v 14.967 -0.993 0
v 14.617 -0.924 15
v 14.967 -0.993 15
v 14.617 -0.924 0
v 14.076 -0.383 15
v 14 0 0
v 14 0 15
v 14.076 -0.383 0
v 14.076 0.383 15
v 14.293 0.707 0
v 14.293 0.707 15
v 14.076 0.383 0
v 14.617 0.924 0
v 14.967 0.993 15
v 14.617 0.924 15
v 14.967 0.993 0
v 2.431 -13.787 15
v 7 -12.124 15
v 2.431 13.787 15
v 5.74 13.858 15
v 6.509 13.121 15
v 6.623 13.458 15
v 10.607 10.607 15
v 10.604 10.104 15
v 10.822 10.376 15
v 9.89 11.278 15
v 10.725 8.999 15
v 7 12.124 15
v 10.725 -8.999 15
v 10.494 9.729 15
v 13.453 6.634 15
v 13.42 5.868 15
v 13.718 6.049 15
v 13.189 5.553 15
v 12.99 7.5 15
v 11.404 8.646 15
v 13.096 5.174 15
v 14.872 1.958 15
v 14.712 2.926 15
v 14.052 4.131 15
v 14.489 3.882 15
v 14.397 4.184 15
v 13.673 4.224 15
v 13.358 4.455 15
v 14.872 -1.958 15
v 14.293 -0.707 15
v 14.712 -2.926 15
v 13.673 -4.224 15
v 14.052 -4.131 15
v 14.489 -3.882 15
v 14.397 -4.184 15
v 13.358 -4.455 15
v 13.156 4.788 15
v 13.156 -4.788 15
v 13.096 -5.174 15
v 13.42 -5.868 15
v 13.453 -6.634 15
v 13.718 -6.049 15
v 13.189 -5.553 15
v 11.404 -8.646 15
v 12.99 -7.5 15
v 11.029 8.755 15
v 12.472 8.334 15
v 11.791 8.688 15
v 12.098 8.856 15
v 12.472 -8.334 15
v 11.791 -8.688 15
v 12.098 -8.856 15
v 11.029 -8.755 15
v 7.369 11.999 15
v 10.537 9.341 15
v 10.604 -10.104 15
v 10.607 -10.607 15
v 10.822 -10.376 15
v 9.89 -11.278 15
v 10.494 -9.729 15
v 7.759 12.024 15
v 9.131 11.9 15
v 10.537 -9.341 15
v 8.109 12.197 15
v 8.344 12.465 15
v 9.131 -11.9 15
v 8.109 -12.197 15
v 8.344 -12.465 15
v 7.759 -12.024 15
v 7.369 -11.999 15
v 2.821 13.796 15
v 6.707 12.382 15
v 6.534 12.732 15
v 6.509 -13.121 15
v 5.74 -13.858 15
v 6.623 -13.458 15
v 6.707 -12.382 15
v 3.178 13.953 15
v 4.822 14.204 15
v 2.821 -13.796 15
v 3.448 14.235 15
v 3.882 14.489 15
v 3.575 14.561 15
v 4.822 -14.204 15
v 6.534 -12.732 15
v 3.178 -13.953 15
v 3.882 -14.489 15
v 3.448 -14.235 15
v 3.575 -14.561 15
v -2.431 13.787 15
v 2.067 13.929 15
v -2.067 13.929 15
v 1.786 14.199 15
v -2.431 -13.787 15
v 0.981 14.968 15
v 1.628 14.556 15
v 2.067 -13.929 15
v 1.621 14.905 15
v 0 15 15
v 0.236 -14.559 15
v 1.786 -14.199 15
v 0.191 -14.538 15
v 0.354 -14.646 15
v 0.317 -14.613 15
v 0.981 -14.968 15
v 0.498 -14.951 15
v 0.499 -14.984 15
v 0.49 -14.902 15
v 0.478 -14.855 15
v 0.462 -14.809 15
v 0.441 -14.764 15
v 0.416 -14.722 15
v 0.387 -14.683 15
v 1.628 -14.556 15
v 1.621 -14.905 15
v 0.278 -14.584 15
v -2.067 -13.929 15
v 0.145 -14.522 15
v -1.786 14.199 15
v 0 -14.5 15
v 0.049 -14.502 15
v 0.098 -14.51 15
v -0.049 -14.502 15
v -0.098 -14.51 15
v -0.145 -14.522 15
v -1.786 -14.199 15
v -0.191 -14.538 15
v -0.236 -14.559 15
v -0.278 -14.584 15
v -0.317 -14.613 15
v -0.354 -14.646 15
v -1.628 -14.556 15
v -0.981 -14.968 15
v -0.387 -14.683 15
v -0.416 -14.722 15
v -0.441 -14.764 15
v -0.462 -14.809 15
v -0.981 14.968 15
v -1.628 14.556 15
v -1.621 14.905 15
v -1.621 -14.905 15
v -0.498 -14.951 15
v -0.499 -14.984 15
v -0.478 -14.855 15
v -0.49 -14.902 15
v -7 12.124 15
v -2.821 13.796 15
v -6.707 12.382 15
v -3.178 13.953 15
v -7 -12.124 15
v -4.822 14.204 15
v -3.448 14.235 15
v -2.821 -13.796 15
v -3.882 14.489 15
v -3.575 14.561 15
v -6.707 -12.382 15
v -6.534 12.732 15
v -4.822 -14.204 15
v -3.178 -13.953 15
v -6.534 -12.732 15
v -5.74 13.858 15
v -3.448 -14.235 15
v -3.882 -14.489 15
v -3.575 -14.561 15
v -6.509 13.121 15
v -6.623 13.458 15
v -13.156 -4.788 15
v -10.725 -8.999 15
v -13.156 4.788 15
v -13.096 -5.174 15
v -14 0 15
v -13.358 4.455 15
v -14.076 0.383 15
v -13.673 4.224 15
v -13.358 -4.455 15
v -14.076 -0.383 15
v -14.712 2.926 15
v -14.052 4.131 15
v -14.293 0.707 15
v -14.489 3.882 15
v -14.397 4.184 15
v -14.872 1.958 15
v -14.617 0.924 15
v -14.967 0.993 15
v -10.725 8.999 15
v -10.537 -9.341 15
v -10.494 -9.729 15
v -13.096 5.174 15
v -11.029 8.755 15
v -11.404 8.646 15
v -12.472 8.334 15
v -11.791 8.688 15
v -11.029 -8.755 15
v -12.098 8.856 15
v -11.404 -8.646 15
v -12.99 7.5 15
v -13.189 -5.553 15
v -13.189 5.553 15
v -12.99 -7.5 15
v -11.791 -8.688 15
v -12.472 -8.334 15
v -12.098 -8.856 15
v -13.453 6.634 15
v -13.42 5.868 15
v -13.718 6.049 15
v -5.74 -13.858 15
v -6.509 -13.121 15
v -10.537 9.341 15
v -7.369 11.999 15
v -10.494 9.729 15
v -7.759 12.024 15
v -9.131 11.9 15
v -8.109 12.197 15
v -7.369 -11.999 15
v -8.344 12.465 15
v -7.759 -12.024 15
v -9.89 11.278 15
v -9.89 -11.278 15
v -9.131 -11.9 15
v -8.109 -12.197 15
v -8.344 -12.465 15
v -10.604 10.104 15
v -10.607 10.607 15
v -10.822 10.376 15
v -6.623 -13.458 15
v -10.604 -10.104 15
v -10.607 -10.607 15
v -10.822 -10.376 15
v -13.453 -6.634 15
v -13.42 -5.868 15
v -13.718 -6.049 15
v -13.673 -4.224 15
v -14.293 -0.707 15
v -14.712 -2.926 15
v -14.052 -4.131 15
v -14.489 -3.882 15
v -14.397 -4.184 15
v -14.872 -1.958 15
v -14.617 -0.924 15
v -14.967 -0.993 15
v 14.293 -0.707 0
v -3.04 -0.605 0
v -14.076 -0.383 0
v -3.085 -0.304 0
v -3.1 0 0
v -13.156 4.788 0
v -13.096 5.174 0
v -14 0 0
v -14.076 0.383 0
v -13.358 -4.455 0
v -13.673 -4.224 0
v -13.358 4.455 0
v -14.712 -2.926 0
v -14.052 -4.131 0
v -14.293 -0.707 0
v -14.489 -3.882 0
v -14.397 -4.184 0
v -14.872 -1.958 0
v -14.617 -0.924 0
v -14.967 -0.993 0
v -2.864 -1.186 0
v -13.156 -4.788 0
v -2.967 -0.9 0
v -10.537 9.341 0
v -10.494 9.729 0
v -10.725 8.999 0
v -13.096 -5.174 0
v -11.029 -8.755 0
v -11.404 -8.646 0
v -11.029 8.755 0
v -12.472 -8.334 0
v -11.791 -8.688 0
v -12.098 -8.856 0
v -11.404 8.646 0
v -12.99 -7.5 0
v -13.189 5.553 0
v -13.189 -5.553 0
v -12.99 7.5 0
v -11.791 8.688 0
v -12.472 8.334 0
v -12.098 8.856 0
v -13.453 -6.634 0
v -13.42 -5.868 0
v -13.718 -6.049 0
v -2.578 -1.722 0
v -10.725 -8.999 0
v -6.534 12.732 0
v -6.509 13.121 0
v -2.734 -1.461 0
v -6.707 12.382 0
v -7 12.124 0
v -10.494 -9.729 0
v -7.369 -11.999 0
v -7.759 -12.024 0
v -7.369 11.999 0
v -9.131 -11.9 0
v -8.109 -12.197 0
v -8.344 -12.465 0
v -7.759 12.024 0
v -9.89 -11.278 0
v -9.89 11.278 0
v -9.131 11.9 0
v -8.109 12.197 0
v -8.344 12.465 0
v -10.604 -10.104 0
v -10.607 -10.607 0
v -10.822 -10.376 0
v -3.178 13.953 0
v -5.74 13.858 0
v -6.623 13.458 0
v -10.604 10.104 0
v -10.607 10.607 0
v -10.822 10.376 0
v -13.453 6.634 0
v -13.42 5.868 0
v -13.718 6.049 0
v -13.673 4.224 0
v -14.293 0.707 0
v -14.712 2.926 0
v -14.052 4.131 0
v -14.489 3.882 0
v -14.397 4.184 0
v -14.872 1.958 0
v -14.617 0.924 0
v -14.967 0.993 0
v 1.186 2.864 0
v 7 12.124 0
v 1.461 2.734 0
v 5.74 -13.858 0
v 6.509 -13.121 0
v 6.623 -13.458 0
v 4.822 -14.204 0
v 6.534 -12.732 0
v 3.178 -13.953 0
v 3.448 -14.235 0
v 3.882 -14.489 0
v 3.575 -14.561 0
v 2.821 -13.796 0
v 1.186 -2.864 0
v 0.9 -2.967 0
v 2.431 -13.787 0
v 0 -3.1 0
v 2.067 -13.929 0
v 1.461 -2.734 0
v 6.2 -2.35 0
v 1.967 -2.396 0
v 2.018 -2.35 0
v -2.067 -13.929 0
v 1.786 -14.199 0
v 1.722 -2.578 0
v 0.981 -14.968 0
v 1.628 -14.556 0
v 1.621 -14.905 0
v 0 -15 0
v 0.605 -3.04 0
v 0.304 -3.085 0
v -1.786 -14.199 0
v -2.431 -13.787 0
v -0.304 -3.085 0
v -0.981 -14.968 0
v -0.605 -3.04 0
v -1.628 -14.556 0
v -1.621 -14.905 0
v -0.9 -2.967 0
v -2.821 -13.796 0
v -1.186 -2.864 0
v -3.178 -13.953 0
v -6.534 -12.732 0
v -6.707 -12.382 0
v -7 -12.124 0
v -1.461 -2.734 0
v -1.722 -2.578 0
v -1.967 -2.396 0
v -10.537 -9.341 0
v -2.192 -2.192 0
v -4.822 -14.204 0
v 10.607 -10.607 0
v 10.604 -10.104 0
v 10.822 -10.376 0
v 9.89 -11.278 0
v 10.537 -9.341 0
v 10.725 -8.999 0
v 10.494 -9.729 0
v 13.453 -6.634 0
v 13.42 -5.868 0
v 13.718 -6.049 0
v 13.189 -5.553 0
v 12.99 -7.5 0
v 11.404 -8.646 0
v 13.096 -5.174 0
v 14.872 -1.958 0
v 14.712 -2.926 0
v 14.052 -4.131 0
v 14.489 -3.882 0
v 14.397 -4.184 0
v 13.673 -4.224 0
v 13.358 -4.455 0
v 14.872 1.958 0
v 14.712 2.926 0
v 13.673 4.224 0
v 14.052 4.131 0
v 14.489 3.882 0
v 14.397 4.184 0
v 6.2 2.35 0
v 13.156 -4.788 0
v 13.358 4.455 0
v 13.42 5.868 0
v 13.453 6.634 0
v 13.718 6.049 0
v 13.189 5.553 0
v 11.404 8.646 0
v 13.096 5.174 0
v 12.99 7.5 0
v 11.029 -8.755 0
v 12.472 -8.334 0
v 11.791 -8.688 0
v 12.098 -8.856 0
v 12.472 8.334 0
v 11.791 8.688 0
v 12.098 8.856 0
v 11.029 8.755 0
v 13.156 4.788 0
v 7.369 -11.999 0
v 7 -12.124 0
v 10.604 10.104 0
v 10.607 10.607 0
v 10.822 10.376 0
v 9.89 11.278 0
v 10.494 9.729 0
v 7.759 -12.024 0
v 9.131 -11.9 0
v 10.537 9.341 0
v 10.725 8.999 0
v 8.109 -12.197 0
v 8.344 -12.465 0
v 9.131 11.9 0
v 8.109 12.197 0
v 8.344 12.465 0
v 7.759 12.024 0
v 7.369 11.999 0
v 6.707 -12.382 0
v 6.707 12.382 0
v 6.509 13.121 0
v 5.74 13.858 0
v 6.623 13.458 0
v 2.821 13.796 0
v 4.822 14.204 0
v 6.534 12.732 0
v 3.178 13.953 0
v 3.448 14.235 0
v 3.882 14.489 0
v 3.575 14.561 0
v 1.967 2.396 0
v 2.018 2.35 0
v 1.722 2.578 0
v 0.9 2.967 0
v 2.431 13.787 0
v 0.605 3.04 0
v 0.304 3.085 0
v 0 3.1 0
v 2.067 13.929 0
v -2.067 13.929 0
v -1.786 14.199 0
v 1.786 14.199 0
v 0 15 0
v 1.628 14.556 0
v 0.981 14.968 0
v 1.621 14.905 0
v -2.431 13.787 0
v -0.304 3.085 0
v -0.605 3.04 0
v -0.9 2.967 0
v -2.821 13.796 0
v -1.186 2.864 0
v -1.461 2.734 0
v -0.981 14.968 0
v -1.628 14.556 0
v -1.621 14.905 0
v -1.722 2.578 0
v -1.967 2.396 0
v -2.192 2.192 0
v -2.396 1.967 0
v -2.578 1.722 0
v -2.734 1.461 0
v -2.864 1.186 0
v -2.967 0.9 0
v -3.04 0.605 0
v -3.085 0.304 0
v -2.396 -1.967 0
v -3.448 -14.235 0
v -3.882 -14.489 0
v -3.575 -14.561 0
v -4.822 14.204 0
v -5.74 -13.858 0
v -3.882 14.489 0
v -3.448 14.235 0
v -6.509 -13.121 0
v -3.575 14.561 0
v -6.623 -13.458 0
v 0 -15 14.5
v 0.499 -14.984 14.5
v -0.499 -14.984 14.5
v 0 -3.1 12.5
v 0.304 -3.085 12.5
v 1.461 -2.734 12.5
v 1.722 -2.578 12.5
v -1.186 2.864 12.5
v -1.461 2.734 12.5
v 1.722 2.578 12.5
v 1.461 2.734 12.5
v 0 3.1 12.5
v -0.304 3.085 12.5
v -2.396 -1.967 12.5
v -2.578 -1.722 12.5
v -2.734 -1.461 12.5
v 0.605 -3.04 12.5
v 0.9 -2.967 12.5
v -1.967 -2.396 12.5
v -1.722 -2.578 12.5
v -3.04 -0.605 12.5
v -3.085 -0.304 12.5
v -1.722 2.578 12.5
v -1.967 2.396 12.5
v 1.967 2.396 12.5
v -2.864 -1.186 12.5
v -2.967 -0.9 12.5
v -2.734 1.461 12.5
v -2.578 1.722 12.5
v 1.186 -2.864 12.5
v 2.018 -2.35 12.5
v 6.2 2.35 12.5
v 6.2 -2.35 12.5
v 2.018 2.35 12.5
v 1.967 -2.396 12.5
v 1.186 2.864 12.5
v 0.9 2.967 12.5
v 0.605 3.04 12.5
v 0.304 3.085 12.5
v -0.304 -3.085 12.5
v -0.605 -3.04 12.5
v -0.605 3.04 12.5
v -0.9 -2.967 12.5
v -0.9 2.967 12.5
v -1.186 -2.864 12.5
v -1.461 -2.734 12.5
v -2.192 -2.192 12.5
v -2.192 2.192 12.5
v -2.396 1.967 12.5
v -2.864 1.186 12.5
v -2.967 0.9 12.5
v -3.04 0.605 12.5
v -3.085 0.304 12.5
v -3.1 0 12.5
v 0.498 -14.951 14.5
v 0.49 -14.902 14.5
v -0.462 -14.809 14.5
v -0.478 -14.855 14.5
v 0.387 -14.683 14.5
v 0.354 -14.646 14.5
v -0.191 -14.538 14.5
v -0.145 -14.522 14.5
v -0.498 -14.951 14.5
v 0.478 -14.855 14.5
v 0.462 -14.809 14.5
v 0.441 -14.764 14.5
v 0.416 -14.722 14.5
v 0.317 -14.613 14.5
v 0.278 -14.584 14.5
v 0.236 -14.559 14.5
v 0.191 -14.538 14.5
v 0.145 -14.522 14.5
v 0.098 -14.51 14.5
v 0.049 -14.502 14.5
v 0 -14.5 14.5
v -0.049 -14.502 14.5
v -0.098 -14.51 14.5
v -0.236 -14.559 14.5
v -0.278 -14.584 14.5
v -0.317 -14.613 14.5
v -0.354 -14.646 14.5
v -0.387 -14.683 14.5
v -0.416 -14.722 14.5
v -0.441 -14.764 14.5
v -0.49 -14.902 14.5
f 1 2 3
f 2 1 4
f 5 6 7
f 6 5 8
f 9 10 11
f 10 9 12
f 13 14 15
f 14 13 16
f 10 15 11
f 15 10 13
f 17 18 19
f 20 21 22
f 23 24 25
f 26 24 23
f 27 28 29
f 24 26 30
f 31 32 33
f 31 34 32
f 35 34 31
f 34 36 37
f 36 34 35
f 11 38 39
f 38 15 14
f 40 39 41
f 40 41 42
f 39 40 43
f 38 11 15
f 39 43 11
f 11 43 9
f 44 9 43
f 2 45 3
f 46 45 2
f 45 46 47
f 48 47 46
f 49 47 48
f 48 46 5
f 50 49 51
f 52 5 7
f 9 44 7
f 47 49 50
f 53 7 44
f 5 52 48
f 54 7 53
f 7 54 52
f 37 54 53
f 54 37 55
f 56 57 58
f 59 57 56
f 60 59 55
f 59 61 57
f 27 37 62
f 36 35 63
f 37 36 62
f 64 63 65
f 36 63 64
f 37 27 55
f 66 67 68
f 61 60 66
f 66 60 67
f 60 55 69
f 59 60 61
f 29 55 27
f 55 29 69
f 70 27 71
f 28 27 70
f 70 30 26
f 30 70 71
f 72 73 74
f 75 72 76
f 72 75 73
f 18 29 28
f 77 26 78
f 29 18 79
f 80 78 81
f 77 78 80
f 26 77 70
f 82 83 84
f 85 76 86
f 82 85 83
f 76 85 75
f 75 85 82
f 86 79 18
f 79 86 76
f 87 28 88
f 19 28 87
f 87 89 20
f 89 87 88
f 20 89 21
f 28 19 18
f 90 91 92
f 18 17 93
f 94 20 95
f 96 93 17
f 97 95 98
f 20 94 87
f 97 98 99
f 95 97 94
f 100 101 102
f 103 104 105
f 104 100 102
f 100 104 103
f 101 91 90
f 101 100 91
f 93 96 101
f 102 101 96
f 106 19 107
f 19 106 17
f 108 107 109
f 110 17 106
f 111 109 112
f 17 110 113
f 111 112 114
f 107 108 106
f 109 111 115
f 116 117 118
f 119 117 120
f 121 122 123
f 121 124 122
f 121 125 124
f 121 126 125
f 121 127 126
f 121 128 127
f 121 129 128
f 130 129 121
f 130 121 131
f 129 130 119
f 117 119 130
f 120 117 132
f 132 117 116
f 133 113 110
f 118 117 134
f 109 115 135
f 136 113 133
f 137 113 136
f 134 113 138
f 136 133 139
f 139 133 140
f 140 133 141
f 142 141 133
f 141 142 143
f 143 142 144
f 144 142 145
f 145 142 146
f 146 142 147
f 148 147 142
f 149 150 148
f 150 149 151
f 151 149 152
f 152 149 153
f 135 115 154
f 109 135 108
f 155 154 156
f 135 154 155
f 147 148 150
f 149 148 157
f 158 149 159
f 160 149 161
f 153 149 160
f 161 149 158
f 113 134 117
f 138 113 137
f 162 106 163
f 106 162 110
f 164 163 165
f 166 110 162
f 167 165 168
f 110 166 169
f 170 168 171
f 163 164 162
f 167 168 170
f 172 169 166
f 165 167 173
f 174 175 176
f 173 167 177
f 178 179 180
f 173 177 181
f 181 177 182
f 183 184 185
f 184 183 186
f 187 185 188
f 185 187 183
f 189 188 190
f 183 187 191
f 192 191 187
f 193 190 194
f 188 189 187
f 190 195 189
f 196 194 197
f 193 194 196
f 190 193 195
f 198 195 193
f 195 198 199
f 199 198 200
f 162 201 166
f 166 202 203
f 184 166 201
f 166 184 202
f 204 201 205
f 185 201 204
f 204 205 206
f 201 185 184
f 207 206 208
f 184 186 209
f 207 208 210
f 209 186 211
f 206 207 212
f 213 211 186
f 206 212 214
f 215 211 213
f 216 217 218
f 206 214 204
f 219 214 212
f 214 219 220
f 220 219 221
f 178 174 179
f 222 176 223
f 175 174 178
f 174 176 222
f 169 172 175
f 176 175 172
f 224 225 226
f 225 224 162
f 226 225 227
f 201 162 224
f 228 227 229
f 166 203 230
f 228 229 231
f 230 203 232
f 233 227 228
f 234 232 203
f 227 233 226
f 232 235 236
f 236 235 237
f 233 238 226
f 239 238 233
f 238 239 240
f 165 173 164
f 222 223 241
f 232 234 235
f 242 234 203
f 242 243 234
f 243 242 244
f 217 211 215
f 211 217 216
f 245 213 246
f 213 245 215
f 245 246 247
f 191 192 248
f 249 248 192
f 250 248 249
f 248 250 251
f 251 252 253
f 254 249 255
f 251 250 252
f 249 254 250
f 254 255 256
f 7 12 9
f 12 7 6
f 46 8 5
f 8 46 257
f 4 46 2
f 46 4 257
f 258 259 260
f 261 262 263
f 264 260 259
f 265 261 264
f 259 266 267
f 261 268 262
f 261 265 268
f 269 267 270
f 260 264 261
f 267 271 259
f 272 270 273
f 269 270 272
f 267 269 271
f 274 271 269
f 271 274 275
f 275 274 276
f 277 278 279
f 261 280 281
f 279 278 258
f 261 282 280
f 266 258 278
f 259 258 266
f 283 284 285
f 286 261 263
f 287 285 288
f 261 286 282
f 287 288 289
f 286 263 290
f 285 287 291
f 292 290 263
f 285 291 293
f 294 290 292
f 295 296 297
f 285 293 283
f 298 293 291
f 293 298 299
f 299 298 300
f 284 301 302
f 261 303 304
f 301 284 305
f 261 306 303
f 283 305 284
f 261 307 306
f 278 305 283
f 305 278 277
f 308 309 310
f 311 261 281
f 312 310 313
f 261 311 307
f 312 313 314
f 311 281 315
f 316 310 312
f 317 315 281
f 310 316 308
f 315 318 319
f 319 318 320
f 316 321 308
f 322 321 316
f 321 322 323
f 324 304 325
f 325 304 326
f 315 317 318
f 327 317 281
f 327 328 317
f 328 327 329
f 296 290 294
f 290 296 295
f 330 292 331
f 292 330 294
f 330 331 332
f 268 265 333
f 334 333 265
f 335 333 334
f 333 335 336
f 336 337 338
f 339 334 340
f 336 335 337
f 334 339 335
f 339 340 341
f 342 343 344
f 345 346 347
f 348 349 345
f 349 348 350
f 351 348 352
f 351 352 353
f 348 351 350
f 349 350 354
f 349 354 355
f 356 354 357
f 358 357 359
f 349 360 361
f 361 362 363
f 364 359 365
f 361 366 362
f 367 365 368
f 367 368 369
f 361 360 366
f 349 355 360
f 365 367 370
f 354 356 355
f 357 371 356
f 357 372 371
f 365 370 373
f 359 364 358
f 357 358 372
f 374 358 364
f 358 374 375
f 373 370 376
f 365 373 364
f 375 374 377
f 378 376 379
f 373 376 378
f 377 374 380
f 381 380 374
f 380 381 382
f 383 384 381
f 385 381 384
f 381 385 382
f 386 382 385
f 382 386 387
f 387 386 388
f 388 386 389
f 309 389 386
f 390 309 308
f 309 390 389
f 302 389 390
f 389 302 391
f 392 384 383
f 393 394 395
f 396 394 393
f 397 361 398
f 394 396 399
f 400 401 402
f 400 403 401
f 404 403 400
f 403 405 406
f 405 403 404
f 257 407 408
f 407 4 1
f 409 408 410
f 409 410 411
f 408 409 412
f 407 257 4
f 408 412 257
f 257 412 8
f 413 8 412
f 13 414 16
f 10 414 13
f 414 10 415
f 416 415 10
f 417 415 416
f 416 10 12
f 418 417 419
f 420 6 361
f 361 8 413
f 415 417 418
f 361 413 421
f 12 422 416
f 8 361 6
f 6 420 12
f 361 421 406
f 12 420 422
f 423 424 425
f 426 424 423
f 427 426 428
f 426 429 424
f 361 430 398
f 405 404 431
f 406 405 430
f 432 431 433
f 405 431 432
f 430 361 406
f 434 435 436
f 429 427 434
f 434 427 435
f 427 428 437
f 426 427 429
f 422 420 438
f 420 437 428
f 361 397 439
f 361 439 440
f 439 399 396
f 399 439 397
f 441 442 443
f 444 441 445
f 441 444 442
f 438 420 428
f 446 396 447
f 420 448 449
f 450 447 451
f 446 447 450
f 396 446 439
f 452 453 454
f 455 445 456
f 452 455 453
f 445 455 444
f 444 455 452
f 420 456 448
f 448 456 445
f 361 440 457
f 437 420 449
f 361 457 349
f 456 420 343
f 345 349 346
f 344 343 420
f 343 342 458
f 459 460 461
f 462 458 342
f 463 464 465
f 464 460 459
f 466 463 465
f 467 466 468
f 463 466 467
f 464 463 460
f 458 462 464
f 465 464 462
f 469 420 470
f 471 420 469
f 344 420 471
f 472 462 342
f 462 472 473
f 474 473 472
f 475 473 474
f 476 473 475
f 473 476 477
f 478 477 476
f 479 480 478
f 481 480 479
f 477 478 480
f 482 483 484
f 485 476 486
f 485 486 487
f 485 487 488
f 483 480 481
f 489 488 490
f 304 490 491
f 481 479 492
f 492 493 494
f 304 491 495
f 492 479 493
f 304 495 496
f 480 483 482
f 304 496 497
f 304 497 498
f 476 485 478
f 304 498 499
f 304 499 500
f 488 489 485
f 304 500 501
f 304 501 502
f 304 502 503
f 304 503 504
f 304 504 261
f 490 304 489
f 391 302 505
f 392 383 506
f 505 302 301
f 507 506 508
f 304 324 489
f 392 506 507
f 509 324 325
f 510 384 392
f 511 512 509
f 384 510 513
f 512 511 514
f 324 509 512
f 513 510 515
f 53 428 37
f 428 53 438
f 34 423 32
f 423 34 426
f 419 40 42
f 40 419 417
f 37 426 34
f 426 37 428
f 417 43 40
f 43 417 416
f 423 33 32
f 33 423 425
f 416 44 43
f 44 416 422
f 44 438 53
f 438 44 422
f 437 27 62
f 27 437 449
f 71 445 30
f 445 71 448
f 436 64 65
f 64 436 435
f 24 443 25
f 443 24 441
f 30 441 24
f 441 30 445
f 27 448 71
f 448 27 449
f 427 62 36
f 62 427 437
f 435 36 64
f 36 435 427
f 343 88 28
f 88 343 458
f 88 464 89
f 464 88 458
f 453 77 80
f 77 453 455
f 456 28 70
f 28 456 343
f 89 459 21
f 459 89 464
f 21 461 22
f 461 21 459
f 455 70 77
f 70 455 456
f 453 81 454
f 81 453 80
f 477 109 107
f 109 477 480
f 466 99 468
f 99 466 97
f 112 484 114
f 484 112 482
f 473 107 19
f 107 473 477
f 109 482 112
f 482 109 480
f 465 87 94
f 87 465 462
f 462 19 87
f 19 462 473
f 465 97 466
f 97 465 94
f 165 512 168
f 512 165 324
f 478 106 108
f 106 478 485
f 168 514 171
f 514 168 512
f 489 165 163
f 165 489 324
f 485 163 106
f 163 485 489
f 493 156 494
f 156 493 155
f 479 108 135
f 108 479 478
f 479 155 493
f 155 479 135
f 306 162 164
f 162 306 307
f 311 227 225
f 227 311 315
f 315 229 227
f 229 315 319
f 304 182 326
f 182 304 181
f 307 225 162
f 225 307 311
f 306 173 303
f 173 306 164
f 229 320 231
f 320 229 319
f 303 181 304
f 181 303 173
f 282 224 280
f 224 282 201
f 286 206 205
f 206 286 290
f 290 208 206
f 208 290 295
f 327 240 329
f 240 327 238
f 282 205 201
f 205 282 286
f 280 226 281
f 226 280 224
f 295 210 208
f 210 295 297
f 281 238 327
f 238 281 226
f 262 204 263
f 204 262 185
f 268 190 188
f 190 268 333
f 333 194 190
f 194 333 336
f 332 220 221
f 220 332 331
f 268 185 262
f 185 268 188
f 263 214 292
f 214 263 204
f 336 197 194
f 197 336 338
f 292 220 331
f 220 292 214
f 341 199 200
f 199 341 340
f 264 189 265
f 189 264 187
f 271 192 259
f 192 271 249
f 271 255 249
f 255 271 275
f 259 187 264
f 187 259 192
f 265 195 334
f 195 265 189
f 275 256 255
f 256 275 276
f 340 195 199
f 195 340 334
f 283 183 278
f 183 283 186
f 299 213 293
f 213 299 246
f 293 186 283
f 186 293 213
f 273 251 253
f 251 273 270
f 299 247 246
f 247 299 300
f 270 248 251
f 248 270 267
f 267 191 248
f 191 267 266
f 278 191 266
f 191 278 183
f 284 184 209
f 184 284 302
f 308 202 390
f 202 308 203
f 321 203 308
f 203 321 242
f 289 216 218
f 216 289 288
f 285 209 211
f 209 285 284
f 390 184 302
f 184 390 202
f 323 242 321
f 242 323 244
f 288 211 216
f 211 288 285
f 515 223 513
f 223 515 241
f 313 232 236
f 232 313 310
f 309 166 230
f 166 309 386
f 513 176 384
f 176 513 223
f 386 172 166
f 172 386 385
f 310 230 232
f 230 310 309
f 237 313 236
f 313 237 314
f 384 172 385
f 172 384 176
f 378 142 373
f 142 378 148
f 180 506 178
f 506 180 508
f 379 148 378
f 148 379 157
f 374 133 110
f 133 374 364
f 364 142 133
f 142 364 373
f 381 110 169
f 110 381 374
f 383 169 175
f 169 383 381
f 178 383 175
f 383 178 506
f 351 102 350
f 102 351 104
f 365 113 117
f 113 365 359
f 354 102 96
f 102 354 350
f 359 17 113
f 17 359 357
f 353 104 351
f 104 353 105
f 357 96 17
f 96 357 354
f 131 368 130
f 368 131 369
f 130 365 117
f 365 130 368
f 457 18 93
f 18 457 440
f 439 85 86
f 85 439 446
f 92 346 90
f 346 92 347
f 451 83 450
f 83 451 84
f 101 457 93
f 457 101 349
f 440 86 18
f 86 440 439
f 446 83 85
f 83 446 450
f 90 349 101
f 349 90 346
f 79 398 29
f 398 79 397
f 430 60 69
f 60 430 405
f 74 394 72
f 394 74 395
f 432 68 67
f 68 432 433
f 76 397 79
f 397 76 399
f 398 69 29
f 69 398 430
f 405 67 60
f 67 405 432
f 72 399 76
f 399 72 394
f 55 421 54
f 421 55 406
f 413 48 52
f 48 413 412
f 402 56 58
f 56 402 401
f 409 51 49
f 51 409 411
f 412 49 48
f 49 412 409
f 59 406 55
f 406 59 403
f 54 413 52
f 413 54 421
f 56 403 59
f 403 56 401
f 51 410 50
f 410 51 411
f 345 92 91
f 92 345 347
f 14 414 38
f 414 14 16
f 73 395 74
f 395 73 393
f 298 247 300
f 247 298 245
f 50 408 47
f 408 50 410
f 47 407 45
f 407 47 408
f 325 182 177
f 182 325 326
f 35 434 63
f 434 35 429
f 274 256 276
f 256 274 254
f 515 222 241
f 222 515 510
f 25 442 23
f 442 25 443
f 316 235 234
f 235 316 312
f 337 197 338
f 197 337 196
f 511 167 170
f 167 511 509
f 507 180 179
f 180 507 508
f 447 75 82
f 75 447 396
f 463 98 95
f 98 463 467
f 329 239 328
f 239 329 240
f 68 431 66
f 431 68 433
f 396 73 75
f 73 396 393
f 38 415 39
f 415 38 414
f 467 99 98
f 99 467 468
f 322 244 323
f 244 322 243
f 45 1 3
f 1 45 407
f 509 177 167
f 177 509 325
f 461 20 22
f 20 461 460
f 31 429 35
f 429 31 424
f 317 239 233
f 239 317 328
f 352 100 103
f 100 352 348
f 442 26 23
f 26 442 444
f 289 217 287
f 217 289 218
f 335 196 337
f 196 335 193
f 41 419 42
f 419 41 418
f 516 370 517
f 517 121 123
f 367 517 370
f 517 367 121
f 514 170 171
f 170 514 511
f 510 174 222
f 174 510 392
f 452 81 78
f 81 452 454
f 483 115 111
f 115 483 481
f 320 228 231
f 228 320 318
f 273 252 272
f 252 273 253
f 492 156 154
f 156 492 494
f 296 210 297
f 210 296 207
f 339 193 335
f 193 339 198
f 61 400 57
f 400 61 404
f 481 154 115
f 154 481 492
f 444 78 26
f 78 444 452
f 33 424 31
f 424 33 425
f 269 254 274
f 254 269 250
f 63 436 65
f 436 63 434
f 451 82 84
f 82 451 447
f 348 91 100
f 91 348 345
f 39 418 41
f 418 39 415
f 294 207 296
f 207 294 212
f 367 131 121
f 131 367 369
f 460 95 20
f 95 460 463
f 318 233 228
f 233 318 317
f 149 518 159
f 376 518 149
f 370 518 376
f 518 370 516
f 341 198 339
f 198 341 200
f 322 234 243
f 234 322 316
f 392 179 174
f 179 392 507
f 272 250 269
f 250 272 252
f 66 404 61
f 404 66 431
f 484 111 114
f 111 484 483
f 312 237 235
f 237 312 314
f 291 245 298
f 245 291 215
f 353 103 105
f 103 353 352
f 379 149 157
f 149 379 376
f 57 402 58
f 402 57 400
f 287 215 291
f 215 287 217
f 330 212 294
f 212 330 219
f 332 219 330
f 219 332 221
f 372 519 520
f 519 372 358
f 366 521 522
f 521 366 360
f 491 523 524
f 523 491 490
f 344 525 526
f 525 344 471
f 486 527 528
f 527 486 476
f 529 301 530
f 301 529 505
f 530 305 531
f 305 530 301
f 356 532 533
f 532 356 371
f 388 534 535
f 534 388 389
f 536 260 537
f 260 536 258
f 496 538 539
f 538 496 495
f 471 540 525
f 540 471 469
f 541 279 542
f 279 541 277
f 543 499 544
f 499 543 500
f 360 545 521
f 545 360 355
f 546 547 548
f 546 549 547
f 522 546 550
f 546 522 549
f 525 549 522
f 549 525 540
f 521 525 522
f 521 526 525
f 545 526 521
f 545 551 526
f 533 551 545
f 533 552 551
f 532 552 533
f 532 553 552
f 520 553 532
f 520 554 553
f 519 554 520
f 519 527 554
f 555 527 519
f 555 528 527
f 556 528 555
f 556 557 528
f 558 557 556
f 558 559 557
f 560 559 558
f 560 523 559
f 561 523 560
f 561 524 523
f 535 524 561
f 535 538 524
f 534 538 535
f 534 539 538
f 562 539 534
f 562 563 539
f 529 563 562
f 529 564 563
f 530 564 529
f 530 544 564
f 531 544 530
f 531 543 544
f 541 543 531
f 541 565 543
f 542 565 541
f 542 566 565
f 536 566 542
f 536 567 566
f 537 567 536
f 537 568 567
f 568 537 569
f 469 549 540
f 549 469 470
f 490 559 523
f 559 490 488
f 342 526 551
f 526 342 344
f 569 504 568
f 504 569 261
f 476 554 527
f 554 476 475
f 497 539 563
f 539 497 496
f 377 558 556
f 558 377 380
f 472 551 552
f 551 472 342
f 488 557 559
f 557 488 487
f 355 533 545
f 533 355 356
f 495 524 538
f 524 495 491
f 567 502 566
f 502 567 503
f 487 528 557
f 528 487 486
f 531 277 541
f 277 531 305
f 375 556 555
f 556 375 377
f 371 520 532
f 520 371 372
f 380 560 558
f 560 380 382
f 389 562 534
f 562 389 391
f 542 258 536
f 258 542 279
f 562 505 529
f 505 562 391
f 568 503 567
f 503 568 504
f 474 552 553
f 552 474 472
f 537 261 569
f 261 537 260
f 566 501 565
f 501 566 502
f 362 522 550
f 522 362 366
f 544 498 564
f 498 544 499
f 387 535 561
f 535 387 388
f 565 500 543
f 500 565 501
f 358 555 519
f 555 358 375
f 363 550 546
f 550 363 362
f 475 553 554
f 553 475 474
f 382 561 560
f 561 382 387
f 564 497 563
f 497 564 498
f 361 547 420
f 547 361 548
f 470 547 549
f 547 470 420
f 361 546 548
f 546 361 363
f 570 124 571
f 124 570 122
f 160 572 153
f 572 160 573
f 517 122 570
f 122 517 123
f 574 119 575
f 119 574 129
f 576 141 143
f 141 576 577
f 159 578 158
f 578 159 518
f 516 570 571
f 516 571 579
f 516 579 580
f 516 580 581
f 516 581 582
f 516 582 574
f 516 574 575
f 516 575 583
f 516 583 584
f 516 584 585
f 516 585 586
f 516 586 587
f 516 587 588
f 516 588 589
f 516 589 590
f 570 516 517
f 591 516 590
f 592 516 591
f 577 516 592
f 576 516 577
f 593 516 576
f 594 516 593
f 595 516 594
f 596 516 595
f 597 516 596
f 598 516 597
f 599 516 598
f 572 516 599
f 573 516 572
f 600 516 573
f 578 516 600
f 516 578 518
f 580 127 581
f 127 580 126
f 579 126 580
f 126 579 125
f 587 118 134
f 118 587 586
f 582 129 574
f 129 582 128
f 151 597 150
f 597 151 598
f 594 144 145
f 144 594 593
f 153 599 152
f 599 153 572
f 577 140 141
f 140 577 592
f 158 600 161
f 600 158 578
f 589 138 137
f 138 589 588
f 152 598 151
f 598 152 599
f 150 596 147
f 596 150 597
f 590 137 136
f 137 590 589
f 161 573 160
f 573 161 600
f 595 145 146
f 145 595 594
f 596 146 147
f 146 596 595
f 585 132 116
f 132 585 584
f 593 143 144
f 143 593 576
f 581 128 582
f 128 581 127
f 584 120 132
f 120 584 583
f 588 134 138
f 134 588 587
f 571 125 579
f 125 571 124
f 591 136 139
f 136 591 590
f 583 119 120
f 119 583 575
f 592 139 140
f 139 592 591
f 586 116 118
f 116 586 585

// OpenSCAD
// Replacement knob for hotplate stirrer (D-shaft 6 mm)
// Print orientation: bottom face (with D-bore) on bed, z = 0

// ---------- Parameters ----------
knob_d        = 30;    // knob outer diameter
knob_h        = 15;    // knob height
shaft_d       = 6.2;   // D-bore diameter (circle)
shaft_flat    = 4.7;   // distance from flat to opposite side of D-bore
bore_depth    = 12;    // D-bore depth from bottom face
groove_count  = 18;    // number of vertical grip grooves
groove_d      = 2;     // groove diameter (half-cylinder)
pointer_w     = 1.5;   // pointer groove width at top face
pointer_d     = pointer_w * 2 / 3; // pointer groove diameter at centre
eps           = 0.5;   // overcut for clean differences

$fn = 96;

// ---------- Model ----------
difference() {
    // Main knob body
    cylinder(d = knob_d, h = knob_h);

    // D-shaped blind bore from bottom face
    translate([0, 0, -eps])
        cylinder(d = shaft_d, h = bore_depth + 2 * eps, $fn = 64);
    // flat on the D (on -y side)
    translate([0, -shaft_flat / 2, -eps])
        cube([shaft_d, shaft_flat, bore_depth + 2 * eps]);

    // Vertical grip grooves along full height, centred on outer surface
    for (i = [0 : groove_count - 1]) {
        a = i * 360 / groove_count;
        rotate([0, 0, a])
            translate([knob_d / 2, 0, 0])
                cylinder(d = groove_d, h = knob_h, $fn = 16);
    }

    // Pointer groove on top face, same side as D flat (-y)
    translate([0, -knob_d / 2, knob_h - pointer_d / 2])
        linear_extrude(height = pointer_w)
            circle(d = pointer_d, $fn = 64);
}
